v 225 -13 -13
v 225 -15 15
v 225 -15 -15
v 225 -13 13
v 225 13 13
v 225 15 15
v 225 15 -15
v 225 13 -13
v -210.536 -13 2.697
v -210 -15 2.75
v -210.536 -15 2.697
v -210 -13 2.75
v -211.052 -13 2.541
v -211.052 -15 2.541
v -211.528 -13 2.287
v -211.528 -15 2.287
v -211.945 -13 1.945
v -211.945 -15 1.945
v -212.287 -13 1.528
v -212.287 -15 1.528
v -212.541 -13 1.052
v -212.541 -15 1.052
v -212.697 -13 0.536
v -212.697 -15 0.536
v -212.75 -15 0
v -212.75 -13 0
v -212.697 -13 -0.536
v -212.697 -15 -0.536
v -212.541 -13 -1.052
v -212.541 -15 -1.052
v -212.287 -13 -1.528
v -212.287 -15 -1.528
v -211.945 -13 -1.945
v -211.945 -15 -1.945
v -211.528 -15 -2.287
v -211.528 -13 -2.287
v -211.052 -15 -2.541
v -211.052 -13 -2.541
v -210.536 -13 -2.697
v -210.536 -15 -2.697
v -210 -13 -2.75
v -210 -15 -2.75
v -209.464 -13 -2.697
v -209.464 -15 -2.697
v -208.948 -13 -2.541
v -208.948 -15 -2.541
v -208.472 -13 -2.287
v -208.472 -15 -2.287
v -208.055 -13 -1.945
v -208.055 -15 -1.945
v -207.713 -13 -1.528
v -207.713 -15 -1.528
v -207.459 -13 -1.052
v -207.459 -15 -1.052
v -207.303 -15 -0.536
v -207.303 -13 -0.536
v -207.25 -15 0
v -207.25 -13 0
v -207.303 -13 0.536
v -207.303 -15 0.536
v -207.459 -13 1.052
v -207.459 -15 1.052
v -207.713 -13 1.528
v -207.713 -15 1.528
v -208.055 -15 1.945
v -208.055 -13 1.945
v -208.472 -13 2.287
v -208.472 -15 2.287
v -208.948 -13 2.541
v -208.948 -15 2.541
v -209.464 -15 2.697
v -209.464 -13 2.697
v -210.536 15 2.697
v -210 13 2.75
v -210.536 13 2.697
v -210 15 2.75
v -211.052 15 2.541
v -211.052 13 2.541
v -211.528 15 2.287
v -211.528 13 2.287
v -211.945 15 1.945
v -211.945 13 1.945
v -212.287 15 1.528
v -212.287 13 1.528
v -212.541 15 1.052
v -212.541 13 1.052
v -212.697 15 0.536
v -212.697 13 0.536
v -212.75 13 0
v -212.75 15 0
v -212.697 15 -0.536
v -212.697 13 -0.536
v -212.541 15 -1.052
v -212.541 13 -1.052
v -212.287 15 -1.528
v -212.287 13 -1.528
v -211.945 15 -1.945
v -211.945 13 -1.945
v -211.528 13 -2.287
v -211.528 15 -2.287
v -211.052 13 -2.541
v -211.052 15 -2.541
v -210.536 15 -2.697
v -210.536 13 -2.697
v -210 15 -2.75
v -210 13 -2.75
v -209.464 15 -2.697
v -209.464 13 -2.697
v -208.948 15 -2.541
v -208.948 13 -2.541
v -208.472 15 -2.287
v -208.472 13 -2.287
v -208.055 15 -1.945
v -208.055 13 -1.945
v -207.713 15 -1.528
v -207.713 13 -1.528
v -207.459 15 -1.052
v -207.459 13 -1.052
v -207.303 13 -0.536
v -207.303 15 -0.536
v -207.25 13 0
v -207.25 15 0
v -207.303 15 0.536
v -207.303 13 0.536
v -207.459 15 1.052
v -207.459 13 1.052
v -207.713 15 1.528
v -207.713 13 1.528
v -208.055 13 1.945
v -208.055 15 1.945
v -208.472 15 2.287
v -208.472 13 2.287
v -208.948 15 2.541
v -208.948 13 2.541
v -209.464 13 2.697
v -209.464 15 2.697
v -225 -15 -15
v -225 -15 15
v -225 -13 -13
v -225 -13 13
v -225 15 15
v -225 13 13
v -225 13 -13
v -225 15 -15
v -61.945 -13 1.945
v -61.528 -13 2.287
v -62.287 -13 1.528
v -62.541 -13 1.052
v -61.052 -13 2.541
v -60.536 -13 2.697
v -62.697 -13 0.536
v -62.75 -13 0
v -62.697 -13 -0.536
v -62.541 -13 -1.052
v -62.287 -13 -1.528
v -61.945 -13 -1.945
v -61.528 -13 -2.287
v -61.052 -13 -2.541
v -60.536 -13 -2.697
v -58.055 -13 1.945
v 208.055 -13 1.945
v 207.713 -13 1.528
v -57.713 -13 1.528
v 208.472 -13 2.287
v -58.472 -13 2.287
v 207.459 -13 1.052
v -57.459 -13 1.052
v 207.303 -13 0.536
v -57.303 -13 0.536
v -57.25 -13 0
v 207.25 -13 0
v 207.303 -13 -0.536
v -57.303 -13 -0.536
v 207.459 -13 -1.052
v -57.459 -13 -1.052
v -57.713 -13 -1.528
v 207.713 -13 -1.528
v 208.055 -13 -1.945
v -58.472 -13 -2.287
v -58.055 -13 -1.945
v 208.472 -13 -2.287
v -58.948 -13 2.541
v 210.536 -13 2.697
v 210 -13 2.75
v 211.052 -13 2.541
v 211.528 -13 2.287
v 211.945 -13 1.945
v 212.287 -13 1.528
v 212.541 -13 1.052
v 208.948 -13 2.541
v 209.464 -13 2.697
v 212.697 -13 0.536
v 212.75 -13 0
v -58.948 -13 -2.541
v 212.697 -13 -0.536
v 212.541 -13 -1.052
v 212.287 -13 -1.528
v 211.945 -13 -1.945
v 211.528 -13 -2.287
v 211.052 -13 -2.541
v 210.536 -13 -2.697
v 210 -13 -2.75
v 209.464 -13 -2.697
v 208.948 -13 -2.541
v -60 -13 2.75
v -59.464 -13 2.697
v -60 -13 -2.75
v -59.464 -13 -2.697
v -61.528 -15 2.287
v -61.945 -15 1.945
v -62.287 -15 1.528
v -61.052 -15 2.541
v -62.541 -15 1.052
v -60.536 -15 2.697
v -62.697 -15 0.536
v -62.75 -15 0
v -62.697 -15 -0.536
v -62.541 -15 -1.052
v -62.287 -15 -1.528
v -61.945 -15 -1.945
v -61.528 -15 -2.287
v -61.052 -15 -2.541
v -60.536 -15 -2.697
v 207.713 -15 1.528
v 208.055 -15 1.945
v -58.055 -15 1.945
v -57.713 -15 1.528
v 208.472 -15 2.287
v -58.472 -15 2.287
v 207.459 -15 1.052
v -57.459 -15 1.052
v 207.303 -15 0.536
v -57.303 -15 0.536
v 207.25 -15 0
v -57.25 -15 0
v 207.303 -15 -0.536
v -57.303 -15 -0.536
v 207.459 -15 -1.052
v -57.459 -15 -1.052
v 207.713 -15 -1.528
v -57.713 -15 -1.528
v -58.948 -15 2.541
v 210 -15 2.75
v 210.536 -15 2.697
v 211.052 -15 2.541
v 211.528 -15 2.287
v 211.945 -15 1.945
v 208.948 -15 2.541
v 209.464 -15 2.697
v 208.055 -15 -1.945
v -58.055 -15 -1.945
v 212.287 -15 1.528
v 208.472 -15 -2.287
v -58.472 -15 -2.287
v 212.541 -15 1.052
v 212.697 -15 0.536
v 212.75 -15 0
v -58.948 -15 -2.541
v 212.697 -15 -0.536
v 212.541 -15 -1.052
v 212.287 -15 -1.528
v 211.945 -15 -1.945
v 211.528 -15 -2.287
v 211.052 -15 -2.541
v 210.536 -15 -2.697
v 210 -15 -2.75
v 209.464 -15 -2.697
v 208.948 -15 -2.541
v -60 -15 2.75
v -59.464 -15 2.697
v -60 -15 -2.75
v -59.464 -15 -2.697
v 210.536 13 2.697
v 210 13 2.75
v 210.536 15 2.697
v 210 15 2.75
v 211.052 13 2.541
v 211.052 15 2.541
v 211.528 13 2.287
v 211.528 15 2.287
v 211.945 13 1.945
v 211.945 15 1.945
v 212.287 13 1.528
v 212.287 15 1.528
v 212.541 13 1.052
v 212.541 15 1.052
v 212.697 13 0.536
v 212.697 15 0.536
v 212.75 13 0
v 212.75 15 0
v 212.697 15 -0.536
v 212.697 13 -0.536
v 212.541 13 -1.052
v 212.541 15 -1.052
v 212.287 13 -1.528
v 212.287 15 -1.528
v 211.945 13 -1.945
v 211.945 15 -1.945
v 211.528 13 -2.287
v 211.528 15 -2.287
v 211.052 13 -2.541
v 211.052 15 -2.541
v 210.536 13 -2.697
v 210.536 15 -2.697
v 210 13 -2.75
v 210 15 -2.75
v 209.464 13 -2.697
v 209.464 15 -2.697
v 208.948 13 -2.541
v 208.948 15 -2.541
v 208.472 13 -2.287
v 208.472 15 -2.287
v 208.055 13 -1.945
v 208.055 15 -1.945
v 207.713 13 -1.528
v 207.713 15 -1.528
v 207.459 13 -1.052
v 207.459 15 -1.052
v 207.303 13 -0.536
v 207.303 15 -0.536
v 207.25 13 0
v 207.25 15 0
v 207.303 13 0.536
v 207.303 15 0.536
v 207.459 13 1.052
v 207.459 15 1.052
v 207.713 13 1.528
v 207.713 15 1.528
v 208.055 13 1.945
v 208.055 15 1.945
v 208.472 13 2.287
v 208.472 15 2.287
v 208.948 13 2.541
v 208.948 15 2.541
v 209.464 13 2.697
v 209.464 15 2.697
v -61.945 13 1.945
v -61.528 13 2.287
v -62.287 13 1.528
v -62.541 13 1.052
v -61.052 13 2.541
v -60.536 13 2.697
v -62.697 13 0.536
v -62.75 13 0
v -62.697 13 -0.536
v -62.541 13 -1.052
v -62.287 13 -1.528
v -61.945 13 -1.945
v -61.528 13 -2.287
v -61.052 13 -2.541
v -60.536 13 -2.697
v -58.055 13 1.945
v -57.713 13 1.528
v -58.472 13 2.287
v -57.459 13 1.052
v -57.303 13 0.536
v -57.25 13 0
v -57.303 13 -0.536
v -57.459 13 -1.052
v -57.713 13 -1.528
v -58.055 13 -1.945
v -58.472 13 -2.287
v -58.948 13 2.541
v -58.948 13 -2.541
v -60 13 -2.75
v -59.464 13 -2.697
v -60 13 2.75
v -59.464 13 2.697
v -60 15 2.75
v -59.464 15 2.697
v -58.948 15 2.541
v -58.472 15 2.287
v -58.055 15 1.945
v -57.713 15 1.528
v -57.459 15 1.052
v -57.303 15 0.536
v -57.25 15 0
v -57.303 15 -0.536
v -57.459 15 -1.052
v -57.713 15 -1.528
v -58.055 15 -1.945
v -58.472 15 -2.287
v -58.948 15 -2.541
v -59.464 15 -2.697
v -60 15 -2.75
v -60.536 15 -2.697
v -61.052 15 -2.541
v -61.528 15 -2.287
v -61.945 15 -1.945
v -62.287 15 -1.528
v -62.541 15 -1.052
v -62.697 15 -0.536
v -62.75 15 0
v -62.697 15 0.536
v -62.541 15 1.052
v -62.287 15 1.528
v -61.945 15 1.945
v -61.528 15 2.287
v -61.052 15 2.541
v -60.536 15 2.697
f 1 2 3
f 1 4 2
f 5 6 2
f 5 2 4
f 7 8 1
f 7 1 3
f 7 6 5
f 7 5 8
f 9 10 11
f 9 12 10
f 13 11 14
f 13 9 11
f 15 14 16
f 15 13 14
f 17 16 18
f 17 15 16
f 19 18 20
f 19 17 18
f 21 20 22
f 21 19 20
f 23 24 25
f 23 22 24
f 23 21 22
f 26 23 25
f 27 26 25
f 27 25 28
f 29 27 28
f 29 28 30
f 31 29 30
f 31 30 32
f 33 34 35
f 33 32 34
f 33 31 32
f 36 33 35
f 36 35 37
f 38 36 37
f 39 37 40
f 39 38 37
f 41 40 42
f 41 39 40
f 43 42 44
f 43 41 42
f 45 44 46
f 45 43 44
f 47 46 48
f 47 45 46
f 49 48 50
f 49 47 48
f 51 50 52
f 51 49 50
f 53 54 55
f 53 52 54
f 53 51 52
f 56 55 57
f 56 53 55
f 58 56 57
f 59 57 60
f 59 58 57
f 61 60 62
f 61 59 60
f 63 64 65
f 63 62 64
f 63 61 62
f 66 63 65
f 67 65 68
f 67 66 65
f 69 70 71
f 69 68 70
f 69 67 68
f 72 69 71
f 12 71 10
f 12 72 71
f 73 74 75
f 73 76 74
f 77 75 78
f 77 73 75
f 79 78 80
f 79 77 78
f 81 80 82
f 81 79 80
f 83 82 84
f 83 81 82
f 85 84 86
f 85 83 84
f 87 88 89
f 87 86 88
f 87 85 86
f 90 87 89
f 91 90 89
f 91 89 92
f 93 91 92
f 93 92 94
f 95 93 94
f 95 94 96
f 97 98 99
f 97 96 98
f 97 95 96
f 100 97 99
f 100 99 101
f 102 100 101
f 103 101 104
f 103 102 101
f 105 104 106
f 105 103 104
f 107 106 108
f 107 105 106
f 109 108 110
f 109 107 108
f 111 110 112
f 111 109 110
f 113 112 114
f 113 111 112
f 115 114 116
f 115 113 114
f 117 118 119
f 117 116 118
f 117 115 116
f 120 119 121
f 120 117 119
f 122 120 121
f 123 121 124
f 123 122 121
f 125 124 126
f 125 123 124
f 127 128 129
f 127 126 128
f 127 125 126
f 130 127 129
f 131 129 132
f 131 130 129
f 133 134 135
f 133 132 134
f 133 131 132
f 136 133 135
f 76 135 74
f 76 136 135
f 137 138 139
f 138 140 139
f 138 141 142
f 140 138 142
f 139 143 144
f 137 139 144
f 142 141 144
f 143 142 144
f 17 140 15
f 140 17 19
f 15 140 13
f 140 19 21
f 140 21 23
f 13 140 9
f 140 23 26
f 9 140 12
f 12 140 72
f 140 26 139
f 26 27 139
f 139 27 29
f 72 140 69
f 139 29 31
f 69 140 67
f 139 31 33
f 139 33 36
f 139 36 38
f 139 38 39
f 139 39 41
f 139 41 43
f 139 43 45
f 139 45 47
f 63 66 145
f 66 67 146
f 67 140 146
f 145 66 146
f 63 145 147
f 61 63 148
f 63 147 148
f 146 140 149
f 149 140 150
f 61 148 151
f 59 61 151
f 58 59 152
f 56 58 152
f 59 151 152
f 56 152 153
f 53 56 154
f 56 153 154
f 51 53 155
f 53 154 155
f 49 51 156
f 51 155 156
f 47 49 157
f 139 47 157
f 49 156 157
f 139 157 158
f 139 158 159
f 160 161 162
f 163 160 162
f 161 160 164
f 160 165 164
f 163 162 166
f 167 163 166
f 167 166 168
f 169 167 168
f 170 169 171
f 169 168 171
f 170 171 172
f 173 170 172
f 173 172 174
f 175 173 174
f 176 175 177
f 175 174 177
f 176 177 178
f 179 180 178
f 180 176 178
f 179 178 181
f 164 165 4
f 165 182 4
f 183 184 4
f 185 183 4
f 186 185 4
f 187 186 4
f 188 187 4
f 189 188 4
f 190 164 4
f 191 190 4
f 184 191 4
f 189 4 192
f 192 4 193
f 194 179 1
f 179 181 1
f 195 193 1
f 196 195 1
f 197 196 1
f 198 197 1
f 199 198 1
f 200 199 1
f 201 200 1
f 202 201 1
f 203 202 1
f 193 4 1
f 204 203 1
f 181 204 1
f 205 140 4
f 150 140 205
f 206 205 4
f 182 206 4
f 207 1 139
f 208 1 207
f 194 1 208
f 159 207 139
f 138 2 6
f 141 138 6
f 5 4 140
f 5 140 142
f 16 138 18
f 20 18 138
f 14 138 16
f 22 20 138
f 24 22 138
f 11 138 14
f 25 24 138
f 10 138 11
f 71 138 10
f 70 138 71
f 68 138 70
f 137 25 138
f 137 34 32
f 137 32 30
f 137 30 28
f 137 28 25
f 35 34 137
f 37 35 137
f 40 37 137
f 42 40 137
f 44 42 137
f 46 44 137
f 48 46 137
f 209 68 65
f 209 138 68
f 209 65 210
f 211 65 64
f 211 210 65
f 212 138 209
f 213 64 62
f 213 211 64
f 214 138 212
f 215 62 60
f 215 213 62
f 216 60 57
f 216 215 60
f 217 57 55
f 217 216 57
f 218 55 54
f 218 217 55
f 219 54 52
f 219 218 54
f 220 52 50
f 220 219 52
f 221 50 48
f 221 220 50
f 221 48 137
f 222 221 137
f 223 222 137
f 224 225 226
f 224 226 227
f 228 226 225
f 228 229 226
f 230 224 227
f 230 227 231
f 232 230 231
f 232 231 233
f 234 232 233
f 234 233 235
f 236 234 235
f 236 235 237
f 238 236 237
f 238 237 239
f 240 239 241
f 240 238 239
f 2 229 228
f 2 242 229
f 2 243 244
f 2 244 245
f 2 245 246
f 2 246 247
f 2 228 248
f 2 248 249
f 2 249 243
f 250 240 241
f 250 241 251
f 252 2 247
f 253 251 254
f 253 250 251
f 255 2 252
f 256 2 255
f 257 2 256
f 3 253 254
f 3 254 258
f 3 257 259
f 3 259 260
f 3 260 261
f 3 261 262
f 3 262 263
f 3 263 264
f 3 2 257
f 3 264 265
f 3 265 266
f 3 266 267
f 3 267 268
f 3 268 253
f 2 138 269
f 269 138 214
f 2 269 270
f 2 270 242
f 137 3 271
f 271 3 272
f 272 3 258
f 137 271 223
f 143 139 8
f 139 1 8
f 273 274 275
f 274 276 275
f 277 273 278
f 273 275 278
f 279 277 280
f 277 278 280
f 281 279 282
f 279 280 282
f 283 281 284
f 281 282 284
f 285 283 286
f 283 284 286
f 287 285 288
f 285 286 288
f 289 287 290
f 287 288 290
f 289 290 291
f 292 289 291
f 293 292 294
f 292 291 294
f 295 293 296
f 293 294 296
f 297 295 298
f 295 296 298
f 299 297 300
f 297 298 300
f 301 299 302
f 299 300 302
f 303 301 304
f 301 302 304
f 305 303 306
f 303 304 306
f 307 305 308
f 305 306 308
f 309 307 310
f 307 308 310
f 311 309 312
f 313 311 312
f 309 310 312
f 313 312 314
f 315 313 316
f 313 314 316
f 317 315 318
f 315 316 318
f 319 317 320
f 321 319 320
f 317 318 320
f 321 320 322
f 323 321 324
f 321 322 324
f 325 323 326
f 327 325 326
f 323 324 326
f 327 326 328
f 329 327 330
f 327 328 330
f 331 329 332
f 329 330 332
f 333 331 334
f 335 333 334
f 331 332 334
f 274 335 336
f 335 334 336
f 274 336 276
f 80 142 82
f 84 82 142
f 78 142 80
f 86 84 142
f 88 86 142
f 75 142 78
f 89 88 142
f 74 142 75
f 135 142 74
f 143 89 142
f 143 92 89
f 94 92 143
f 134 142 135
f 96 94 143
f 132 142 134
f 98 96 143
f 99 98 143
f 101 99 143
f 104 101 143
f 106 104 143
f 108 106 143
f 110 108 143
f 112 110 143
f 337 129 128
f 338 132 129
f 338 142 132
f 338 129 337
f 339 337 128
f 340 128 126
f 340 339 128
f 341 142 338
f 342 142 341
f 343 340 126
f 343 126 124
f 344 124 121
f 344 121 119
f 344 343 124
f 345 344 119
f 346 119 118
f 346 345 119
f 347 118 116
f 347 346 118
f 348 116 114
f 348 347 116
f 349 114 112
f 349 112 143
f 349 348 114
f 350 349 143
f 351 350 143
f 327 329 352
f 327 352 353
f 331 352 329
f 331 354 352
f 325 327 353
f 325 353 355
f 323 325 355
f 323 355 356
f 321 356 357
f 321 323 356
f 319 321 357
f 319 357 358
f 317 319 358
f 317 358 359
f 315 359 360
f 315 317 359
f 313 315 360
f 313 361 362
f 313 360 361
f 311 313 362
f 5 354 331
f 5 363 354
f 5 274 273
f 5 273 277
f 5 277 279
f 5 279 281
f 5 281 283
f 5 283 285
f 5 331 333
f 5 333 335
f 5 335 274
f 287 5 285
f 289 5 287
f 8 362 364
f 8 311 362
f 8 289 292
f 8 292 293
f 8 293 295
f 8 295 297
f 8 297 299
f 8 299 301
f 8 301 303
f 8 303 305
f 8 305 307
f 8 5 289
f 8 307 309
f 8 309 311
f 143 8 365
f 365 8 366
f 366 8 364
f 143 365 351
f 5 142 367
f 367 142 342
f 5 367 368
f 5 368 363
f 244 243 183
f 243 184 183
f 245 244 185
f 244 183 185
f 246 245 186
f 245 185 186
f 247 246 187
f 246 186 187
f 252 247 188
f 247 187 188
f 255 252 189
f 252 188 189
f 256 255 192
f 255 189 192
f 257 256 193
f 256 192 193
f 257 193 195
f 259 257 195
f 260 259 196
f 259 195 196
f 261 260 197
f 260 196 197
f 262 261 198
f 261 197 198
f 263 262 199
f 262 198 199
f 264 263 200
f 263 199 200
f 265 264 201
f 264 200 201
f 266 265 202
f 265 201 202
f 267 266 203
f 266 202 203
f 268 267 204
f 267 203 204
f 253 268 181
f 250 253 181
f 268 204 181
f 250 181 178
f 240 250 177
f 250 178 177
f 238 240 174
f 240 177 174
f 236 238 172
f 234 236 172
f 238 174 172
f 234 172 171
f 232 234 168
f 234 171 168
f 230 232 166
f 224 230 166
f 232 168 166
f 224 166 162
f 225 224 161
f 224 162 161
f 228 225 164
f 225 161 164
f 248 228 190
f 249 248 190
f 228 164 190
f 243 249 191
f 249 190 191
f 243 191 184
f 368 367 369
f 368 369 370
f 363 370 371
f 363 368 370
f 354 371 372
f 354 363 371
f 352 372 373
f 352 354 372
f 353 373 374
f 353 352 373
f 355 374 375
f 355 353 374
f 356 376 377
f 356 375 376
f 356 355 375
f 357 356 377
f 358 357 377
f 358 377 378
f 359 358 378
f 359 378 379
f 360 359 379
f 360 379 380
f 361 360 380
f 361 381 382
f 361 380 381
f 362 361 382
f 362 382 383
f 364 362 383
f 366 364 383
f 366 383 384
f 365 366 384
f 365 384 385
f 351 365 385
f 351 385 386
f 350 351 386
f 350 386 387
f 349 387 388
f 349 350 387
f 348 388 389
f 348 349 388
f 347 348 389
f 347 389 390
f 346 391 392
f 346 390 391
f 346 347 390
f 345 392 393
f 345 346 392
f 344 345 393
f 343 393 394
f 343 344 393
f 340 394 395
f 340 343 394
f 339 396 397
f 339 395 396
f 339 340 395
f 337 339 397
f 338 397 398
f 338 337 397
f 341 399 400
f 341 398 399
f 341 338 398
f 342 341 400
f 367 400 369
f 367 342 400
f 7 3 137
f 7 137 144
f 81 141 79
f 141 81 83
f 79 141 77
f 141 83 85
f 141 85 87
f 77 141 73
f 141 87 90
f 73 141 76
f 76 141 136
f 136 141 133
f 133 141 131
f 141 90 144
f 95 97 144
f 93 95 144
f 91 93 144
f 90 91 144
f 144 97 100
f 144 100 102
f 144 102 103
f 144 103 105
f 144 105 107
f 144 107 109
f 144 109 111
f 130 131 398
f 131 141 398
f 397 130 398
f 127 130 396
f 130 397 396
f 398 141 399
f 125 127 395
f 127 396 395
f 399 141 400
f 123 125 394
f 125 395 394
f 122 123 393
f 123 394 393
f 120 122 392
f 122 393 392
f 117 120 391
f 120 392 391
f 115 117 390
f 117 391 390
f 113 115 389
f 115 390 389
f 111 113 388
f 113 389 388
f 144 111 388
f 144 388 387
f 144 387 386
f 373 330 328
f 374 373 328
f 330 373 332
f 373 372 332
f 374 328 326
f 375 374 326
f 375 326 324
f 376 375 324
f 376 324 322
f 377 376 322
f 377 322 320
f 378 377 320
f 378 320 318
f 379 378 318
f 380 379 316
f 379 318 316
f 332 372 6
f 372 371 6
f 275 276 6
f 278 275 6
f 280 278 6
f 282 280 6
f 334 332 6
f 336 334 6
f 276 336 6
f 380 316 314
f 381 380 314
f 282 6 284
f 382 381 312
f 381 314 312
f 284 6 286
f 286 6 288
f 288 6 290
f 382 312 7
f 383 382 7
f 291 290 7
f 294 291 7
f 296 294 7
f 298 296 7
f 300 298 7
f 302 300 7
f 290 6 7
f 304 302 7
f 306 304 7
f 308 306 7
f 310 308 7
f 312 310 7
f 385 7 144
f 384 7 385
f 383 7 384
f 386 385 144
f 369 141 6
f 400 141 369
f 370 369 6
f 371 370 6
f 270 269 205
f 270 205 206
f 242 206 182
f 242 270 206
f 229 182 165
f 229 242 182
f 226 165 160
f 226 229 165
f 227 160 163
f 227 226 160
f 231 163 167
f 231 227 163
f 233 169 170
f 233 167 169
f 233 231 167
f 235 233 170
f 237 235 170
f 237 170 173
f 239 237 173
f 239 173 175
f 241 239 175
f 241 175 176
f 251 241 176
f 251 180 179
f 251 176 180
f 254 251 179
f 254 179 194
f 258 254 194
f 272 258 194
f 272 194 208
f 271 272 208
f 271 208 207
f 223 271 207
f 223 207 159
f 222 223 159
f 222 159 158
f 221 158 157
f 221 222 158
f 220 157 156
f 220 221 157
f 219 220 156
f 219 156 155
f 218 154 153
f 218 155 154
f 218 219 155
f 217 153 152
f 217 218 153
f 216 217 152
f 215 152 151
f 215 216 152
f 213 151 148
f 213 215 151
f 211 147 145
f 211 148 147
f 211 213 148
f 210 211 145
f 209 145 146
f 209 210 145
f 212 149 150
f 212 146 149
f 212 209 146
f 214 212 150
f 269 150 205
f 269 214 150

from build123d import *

# Parameters (mm, degrees)
SKETCH1_W               = 30
SKETCH1_H               = 30
SKETCH1_W_2             = 26
SKETCH1_H_2             = 26
BOSS_EXTRUDE1_DEPTH     = 225
SKETCH2_R               = 2.75
CUT_EXTRUDE1_DEPTH      = 226.9977876
CUT_EXTRUDE2_DEPTH      = 226.9977876
CUT_EXTRUDE2_DEPTH_BACK = 226.9977876
SKETCH3_R               = 2.75


with BuildPart() as part:
    # Sketch1 → Boss-Extrude1 (new, symmetric)
    with BuildSketch(Plane(origin=(0, 0, 0), x_dir=(0, 0, -1), z_dir=(1, 0, 0))):
        Rectangle(SKETCH1_W, SKETCH1_H)
        Rectangle(SKETCH1_W_2, SKETCH1_H_2, mode=Mode.SUBTRACT)
    extrude(amount=BOSS_EXTRUDE1_DEPTH, both=True)

    # Sketch2 → Cut-Extrude1 (cut, symmetric)
    with BuildSketch(Plane(origin=(0, 0, 0), x_dir=(1, 0, 0), z_dir=(0, 1, 0))):
        with Locations(Location((210, 0, 0), (0, 0, 270))):
            Circle(SKETCH2_R)
    cut_extrude1 = extrude(amount=CUT_EXTRUDE1_DEPTH, both=True, mode=Mode.SUBTRACT)

    # Mirror1: Cut-Extrude1 across plane
    add(cut_extrude1.mirror(Plane(origin=(0, 0, 0), x_dir=(0, 0, 1), z_dir=(1, 0, 0))), mode=Mode.SUBTRACT)

    # Sketch3 → Cut-Extrude2 (cut, two sides: drawn at the far end of the back side and taken through both)
    with BuildSketch(Plane(origin=(0, 0, 0), x_dir=(1, 0, 0), z_dir=(0, 1, 0)).offset(-CUT_EXTRUDE2_DEPTH_BACK)):
        with Locations(Location((-60, 0, 0), (0, 0, 270))):
            Circle(SKETCH3_R)
    extrude(amount=CUT_EXTRUDE2_DEPTH + CUT_EXTRUDE2_DEPTH_BACK, mode=Mode.SUBTRACT)


solid = part.part
